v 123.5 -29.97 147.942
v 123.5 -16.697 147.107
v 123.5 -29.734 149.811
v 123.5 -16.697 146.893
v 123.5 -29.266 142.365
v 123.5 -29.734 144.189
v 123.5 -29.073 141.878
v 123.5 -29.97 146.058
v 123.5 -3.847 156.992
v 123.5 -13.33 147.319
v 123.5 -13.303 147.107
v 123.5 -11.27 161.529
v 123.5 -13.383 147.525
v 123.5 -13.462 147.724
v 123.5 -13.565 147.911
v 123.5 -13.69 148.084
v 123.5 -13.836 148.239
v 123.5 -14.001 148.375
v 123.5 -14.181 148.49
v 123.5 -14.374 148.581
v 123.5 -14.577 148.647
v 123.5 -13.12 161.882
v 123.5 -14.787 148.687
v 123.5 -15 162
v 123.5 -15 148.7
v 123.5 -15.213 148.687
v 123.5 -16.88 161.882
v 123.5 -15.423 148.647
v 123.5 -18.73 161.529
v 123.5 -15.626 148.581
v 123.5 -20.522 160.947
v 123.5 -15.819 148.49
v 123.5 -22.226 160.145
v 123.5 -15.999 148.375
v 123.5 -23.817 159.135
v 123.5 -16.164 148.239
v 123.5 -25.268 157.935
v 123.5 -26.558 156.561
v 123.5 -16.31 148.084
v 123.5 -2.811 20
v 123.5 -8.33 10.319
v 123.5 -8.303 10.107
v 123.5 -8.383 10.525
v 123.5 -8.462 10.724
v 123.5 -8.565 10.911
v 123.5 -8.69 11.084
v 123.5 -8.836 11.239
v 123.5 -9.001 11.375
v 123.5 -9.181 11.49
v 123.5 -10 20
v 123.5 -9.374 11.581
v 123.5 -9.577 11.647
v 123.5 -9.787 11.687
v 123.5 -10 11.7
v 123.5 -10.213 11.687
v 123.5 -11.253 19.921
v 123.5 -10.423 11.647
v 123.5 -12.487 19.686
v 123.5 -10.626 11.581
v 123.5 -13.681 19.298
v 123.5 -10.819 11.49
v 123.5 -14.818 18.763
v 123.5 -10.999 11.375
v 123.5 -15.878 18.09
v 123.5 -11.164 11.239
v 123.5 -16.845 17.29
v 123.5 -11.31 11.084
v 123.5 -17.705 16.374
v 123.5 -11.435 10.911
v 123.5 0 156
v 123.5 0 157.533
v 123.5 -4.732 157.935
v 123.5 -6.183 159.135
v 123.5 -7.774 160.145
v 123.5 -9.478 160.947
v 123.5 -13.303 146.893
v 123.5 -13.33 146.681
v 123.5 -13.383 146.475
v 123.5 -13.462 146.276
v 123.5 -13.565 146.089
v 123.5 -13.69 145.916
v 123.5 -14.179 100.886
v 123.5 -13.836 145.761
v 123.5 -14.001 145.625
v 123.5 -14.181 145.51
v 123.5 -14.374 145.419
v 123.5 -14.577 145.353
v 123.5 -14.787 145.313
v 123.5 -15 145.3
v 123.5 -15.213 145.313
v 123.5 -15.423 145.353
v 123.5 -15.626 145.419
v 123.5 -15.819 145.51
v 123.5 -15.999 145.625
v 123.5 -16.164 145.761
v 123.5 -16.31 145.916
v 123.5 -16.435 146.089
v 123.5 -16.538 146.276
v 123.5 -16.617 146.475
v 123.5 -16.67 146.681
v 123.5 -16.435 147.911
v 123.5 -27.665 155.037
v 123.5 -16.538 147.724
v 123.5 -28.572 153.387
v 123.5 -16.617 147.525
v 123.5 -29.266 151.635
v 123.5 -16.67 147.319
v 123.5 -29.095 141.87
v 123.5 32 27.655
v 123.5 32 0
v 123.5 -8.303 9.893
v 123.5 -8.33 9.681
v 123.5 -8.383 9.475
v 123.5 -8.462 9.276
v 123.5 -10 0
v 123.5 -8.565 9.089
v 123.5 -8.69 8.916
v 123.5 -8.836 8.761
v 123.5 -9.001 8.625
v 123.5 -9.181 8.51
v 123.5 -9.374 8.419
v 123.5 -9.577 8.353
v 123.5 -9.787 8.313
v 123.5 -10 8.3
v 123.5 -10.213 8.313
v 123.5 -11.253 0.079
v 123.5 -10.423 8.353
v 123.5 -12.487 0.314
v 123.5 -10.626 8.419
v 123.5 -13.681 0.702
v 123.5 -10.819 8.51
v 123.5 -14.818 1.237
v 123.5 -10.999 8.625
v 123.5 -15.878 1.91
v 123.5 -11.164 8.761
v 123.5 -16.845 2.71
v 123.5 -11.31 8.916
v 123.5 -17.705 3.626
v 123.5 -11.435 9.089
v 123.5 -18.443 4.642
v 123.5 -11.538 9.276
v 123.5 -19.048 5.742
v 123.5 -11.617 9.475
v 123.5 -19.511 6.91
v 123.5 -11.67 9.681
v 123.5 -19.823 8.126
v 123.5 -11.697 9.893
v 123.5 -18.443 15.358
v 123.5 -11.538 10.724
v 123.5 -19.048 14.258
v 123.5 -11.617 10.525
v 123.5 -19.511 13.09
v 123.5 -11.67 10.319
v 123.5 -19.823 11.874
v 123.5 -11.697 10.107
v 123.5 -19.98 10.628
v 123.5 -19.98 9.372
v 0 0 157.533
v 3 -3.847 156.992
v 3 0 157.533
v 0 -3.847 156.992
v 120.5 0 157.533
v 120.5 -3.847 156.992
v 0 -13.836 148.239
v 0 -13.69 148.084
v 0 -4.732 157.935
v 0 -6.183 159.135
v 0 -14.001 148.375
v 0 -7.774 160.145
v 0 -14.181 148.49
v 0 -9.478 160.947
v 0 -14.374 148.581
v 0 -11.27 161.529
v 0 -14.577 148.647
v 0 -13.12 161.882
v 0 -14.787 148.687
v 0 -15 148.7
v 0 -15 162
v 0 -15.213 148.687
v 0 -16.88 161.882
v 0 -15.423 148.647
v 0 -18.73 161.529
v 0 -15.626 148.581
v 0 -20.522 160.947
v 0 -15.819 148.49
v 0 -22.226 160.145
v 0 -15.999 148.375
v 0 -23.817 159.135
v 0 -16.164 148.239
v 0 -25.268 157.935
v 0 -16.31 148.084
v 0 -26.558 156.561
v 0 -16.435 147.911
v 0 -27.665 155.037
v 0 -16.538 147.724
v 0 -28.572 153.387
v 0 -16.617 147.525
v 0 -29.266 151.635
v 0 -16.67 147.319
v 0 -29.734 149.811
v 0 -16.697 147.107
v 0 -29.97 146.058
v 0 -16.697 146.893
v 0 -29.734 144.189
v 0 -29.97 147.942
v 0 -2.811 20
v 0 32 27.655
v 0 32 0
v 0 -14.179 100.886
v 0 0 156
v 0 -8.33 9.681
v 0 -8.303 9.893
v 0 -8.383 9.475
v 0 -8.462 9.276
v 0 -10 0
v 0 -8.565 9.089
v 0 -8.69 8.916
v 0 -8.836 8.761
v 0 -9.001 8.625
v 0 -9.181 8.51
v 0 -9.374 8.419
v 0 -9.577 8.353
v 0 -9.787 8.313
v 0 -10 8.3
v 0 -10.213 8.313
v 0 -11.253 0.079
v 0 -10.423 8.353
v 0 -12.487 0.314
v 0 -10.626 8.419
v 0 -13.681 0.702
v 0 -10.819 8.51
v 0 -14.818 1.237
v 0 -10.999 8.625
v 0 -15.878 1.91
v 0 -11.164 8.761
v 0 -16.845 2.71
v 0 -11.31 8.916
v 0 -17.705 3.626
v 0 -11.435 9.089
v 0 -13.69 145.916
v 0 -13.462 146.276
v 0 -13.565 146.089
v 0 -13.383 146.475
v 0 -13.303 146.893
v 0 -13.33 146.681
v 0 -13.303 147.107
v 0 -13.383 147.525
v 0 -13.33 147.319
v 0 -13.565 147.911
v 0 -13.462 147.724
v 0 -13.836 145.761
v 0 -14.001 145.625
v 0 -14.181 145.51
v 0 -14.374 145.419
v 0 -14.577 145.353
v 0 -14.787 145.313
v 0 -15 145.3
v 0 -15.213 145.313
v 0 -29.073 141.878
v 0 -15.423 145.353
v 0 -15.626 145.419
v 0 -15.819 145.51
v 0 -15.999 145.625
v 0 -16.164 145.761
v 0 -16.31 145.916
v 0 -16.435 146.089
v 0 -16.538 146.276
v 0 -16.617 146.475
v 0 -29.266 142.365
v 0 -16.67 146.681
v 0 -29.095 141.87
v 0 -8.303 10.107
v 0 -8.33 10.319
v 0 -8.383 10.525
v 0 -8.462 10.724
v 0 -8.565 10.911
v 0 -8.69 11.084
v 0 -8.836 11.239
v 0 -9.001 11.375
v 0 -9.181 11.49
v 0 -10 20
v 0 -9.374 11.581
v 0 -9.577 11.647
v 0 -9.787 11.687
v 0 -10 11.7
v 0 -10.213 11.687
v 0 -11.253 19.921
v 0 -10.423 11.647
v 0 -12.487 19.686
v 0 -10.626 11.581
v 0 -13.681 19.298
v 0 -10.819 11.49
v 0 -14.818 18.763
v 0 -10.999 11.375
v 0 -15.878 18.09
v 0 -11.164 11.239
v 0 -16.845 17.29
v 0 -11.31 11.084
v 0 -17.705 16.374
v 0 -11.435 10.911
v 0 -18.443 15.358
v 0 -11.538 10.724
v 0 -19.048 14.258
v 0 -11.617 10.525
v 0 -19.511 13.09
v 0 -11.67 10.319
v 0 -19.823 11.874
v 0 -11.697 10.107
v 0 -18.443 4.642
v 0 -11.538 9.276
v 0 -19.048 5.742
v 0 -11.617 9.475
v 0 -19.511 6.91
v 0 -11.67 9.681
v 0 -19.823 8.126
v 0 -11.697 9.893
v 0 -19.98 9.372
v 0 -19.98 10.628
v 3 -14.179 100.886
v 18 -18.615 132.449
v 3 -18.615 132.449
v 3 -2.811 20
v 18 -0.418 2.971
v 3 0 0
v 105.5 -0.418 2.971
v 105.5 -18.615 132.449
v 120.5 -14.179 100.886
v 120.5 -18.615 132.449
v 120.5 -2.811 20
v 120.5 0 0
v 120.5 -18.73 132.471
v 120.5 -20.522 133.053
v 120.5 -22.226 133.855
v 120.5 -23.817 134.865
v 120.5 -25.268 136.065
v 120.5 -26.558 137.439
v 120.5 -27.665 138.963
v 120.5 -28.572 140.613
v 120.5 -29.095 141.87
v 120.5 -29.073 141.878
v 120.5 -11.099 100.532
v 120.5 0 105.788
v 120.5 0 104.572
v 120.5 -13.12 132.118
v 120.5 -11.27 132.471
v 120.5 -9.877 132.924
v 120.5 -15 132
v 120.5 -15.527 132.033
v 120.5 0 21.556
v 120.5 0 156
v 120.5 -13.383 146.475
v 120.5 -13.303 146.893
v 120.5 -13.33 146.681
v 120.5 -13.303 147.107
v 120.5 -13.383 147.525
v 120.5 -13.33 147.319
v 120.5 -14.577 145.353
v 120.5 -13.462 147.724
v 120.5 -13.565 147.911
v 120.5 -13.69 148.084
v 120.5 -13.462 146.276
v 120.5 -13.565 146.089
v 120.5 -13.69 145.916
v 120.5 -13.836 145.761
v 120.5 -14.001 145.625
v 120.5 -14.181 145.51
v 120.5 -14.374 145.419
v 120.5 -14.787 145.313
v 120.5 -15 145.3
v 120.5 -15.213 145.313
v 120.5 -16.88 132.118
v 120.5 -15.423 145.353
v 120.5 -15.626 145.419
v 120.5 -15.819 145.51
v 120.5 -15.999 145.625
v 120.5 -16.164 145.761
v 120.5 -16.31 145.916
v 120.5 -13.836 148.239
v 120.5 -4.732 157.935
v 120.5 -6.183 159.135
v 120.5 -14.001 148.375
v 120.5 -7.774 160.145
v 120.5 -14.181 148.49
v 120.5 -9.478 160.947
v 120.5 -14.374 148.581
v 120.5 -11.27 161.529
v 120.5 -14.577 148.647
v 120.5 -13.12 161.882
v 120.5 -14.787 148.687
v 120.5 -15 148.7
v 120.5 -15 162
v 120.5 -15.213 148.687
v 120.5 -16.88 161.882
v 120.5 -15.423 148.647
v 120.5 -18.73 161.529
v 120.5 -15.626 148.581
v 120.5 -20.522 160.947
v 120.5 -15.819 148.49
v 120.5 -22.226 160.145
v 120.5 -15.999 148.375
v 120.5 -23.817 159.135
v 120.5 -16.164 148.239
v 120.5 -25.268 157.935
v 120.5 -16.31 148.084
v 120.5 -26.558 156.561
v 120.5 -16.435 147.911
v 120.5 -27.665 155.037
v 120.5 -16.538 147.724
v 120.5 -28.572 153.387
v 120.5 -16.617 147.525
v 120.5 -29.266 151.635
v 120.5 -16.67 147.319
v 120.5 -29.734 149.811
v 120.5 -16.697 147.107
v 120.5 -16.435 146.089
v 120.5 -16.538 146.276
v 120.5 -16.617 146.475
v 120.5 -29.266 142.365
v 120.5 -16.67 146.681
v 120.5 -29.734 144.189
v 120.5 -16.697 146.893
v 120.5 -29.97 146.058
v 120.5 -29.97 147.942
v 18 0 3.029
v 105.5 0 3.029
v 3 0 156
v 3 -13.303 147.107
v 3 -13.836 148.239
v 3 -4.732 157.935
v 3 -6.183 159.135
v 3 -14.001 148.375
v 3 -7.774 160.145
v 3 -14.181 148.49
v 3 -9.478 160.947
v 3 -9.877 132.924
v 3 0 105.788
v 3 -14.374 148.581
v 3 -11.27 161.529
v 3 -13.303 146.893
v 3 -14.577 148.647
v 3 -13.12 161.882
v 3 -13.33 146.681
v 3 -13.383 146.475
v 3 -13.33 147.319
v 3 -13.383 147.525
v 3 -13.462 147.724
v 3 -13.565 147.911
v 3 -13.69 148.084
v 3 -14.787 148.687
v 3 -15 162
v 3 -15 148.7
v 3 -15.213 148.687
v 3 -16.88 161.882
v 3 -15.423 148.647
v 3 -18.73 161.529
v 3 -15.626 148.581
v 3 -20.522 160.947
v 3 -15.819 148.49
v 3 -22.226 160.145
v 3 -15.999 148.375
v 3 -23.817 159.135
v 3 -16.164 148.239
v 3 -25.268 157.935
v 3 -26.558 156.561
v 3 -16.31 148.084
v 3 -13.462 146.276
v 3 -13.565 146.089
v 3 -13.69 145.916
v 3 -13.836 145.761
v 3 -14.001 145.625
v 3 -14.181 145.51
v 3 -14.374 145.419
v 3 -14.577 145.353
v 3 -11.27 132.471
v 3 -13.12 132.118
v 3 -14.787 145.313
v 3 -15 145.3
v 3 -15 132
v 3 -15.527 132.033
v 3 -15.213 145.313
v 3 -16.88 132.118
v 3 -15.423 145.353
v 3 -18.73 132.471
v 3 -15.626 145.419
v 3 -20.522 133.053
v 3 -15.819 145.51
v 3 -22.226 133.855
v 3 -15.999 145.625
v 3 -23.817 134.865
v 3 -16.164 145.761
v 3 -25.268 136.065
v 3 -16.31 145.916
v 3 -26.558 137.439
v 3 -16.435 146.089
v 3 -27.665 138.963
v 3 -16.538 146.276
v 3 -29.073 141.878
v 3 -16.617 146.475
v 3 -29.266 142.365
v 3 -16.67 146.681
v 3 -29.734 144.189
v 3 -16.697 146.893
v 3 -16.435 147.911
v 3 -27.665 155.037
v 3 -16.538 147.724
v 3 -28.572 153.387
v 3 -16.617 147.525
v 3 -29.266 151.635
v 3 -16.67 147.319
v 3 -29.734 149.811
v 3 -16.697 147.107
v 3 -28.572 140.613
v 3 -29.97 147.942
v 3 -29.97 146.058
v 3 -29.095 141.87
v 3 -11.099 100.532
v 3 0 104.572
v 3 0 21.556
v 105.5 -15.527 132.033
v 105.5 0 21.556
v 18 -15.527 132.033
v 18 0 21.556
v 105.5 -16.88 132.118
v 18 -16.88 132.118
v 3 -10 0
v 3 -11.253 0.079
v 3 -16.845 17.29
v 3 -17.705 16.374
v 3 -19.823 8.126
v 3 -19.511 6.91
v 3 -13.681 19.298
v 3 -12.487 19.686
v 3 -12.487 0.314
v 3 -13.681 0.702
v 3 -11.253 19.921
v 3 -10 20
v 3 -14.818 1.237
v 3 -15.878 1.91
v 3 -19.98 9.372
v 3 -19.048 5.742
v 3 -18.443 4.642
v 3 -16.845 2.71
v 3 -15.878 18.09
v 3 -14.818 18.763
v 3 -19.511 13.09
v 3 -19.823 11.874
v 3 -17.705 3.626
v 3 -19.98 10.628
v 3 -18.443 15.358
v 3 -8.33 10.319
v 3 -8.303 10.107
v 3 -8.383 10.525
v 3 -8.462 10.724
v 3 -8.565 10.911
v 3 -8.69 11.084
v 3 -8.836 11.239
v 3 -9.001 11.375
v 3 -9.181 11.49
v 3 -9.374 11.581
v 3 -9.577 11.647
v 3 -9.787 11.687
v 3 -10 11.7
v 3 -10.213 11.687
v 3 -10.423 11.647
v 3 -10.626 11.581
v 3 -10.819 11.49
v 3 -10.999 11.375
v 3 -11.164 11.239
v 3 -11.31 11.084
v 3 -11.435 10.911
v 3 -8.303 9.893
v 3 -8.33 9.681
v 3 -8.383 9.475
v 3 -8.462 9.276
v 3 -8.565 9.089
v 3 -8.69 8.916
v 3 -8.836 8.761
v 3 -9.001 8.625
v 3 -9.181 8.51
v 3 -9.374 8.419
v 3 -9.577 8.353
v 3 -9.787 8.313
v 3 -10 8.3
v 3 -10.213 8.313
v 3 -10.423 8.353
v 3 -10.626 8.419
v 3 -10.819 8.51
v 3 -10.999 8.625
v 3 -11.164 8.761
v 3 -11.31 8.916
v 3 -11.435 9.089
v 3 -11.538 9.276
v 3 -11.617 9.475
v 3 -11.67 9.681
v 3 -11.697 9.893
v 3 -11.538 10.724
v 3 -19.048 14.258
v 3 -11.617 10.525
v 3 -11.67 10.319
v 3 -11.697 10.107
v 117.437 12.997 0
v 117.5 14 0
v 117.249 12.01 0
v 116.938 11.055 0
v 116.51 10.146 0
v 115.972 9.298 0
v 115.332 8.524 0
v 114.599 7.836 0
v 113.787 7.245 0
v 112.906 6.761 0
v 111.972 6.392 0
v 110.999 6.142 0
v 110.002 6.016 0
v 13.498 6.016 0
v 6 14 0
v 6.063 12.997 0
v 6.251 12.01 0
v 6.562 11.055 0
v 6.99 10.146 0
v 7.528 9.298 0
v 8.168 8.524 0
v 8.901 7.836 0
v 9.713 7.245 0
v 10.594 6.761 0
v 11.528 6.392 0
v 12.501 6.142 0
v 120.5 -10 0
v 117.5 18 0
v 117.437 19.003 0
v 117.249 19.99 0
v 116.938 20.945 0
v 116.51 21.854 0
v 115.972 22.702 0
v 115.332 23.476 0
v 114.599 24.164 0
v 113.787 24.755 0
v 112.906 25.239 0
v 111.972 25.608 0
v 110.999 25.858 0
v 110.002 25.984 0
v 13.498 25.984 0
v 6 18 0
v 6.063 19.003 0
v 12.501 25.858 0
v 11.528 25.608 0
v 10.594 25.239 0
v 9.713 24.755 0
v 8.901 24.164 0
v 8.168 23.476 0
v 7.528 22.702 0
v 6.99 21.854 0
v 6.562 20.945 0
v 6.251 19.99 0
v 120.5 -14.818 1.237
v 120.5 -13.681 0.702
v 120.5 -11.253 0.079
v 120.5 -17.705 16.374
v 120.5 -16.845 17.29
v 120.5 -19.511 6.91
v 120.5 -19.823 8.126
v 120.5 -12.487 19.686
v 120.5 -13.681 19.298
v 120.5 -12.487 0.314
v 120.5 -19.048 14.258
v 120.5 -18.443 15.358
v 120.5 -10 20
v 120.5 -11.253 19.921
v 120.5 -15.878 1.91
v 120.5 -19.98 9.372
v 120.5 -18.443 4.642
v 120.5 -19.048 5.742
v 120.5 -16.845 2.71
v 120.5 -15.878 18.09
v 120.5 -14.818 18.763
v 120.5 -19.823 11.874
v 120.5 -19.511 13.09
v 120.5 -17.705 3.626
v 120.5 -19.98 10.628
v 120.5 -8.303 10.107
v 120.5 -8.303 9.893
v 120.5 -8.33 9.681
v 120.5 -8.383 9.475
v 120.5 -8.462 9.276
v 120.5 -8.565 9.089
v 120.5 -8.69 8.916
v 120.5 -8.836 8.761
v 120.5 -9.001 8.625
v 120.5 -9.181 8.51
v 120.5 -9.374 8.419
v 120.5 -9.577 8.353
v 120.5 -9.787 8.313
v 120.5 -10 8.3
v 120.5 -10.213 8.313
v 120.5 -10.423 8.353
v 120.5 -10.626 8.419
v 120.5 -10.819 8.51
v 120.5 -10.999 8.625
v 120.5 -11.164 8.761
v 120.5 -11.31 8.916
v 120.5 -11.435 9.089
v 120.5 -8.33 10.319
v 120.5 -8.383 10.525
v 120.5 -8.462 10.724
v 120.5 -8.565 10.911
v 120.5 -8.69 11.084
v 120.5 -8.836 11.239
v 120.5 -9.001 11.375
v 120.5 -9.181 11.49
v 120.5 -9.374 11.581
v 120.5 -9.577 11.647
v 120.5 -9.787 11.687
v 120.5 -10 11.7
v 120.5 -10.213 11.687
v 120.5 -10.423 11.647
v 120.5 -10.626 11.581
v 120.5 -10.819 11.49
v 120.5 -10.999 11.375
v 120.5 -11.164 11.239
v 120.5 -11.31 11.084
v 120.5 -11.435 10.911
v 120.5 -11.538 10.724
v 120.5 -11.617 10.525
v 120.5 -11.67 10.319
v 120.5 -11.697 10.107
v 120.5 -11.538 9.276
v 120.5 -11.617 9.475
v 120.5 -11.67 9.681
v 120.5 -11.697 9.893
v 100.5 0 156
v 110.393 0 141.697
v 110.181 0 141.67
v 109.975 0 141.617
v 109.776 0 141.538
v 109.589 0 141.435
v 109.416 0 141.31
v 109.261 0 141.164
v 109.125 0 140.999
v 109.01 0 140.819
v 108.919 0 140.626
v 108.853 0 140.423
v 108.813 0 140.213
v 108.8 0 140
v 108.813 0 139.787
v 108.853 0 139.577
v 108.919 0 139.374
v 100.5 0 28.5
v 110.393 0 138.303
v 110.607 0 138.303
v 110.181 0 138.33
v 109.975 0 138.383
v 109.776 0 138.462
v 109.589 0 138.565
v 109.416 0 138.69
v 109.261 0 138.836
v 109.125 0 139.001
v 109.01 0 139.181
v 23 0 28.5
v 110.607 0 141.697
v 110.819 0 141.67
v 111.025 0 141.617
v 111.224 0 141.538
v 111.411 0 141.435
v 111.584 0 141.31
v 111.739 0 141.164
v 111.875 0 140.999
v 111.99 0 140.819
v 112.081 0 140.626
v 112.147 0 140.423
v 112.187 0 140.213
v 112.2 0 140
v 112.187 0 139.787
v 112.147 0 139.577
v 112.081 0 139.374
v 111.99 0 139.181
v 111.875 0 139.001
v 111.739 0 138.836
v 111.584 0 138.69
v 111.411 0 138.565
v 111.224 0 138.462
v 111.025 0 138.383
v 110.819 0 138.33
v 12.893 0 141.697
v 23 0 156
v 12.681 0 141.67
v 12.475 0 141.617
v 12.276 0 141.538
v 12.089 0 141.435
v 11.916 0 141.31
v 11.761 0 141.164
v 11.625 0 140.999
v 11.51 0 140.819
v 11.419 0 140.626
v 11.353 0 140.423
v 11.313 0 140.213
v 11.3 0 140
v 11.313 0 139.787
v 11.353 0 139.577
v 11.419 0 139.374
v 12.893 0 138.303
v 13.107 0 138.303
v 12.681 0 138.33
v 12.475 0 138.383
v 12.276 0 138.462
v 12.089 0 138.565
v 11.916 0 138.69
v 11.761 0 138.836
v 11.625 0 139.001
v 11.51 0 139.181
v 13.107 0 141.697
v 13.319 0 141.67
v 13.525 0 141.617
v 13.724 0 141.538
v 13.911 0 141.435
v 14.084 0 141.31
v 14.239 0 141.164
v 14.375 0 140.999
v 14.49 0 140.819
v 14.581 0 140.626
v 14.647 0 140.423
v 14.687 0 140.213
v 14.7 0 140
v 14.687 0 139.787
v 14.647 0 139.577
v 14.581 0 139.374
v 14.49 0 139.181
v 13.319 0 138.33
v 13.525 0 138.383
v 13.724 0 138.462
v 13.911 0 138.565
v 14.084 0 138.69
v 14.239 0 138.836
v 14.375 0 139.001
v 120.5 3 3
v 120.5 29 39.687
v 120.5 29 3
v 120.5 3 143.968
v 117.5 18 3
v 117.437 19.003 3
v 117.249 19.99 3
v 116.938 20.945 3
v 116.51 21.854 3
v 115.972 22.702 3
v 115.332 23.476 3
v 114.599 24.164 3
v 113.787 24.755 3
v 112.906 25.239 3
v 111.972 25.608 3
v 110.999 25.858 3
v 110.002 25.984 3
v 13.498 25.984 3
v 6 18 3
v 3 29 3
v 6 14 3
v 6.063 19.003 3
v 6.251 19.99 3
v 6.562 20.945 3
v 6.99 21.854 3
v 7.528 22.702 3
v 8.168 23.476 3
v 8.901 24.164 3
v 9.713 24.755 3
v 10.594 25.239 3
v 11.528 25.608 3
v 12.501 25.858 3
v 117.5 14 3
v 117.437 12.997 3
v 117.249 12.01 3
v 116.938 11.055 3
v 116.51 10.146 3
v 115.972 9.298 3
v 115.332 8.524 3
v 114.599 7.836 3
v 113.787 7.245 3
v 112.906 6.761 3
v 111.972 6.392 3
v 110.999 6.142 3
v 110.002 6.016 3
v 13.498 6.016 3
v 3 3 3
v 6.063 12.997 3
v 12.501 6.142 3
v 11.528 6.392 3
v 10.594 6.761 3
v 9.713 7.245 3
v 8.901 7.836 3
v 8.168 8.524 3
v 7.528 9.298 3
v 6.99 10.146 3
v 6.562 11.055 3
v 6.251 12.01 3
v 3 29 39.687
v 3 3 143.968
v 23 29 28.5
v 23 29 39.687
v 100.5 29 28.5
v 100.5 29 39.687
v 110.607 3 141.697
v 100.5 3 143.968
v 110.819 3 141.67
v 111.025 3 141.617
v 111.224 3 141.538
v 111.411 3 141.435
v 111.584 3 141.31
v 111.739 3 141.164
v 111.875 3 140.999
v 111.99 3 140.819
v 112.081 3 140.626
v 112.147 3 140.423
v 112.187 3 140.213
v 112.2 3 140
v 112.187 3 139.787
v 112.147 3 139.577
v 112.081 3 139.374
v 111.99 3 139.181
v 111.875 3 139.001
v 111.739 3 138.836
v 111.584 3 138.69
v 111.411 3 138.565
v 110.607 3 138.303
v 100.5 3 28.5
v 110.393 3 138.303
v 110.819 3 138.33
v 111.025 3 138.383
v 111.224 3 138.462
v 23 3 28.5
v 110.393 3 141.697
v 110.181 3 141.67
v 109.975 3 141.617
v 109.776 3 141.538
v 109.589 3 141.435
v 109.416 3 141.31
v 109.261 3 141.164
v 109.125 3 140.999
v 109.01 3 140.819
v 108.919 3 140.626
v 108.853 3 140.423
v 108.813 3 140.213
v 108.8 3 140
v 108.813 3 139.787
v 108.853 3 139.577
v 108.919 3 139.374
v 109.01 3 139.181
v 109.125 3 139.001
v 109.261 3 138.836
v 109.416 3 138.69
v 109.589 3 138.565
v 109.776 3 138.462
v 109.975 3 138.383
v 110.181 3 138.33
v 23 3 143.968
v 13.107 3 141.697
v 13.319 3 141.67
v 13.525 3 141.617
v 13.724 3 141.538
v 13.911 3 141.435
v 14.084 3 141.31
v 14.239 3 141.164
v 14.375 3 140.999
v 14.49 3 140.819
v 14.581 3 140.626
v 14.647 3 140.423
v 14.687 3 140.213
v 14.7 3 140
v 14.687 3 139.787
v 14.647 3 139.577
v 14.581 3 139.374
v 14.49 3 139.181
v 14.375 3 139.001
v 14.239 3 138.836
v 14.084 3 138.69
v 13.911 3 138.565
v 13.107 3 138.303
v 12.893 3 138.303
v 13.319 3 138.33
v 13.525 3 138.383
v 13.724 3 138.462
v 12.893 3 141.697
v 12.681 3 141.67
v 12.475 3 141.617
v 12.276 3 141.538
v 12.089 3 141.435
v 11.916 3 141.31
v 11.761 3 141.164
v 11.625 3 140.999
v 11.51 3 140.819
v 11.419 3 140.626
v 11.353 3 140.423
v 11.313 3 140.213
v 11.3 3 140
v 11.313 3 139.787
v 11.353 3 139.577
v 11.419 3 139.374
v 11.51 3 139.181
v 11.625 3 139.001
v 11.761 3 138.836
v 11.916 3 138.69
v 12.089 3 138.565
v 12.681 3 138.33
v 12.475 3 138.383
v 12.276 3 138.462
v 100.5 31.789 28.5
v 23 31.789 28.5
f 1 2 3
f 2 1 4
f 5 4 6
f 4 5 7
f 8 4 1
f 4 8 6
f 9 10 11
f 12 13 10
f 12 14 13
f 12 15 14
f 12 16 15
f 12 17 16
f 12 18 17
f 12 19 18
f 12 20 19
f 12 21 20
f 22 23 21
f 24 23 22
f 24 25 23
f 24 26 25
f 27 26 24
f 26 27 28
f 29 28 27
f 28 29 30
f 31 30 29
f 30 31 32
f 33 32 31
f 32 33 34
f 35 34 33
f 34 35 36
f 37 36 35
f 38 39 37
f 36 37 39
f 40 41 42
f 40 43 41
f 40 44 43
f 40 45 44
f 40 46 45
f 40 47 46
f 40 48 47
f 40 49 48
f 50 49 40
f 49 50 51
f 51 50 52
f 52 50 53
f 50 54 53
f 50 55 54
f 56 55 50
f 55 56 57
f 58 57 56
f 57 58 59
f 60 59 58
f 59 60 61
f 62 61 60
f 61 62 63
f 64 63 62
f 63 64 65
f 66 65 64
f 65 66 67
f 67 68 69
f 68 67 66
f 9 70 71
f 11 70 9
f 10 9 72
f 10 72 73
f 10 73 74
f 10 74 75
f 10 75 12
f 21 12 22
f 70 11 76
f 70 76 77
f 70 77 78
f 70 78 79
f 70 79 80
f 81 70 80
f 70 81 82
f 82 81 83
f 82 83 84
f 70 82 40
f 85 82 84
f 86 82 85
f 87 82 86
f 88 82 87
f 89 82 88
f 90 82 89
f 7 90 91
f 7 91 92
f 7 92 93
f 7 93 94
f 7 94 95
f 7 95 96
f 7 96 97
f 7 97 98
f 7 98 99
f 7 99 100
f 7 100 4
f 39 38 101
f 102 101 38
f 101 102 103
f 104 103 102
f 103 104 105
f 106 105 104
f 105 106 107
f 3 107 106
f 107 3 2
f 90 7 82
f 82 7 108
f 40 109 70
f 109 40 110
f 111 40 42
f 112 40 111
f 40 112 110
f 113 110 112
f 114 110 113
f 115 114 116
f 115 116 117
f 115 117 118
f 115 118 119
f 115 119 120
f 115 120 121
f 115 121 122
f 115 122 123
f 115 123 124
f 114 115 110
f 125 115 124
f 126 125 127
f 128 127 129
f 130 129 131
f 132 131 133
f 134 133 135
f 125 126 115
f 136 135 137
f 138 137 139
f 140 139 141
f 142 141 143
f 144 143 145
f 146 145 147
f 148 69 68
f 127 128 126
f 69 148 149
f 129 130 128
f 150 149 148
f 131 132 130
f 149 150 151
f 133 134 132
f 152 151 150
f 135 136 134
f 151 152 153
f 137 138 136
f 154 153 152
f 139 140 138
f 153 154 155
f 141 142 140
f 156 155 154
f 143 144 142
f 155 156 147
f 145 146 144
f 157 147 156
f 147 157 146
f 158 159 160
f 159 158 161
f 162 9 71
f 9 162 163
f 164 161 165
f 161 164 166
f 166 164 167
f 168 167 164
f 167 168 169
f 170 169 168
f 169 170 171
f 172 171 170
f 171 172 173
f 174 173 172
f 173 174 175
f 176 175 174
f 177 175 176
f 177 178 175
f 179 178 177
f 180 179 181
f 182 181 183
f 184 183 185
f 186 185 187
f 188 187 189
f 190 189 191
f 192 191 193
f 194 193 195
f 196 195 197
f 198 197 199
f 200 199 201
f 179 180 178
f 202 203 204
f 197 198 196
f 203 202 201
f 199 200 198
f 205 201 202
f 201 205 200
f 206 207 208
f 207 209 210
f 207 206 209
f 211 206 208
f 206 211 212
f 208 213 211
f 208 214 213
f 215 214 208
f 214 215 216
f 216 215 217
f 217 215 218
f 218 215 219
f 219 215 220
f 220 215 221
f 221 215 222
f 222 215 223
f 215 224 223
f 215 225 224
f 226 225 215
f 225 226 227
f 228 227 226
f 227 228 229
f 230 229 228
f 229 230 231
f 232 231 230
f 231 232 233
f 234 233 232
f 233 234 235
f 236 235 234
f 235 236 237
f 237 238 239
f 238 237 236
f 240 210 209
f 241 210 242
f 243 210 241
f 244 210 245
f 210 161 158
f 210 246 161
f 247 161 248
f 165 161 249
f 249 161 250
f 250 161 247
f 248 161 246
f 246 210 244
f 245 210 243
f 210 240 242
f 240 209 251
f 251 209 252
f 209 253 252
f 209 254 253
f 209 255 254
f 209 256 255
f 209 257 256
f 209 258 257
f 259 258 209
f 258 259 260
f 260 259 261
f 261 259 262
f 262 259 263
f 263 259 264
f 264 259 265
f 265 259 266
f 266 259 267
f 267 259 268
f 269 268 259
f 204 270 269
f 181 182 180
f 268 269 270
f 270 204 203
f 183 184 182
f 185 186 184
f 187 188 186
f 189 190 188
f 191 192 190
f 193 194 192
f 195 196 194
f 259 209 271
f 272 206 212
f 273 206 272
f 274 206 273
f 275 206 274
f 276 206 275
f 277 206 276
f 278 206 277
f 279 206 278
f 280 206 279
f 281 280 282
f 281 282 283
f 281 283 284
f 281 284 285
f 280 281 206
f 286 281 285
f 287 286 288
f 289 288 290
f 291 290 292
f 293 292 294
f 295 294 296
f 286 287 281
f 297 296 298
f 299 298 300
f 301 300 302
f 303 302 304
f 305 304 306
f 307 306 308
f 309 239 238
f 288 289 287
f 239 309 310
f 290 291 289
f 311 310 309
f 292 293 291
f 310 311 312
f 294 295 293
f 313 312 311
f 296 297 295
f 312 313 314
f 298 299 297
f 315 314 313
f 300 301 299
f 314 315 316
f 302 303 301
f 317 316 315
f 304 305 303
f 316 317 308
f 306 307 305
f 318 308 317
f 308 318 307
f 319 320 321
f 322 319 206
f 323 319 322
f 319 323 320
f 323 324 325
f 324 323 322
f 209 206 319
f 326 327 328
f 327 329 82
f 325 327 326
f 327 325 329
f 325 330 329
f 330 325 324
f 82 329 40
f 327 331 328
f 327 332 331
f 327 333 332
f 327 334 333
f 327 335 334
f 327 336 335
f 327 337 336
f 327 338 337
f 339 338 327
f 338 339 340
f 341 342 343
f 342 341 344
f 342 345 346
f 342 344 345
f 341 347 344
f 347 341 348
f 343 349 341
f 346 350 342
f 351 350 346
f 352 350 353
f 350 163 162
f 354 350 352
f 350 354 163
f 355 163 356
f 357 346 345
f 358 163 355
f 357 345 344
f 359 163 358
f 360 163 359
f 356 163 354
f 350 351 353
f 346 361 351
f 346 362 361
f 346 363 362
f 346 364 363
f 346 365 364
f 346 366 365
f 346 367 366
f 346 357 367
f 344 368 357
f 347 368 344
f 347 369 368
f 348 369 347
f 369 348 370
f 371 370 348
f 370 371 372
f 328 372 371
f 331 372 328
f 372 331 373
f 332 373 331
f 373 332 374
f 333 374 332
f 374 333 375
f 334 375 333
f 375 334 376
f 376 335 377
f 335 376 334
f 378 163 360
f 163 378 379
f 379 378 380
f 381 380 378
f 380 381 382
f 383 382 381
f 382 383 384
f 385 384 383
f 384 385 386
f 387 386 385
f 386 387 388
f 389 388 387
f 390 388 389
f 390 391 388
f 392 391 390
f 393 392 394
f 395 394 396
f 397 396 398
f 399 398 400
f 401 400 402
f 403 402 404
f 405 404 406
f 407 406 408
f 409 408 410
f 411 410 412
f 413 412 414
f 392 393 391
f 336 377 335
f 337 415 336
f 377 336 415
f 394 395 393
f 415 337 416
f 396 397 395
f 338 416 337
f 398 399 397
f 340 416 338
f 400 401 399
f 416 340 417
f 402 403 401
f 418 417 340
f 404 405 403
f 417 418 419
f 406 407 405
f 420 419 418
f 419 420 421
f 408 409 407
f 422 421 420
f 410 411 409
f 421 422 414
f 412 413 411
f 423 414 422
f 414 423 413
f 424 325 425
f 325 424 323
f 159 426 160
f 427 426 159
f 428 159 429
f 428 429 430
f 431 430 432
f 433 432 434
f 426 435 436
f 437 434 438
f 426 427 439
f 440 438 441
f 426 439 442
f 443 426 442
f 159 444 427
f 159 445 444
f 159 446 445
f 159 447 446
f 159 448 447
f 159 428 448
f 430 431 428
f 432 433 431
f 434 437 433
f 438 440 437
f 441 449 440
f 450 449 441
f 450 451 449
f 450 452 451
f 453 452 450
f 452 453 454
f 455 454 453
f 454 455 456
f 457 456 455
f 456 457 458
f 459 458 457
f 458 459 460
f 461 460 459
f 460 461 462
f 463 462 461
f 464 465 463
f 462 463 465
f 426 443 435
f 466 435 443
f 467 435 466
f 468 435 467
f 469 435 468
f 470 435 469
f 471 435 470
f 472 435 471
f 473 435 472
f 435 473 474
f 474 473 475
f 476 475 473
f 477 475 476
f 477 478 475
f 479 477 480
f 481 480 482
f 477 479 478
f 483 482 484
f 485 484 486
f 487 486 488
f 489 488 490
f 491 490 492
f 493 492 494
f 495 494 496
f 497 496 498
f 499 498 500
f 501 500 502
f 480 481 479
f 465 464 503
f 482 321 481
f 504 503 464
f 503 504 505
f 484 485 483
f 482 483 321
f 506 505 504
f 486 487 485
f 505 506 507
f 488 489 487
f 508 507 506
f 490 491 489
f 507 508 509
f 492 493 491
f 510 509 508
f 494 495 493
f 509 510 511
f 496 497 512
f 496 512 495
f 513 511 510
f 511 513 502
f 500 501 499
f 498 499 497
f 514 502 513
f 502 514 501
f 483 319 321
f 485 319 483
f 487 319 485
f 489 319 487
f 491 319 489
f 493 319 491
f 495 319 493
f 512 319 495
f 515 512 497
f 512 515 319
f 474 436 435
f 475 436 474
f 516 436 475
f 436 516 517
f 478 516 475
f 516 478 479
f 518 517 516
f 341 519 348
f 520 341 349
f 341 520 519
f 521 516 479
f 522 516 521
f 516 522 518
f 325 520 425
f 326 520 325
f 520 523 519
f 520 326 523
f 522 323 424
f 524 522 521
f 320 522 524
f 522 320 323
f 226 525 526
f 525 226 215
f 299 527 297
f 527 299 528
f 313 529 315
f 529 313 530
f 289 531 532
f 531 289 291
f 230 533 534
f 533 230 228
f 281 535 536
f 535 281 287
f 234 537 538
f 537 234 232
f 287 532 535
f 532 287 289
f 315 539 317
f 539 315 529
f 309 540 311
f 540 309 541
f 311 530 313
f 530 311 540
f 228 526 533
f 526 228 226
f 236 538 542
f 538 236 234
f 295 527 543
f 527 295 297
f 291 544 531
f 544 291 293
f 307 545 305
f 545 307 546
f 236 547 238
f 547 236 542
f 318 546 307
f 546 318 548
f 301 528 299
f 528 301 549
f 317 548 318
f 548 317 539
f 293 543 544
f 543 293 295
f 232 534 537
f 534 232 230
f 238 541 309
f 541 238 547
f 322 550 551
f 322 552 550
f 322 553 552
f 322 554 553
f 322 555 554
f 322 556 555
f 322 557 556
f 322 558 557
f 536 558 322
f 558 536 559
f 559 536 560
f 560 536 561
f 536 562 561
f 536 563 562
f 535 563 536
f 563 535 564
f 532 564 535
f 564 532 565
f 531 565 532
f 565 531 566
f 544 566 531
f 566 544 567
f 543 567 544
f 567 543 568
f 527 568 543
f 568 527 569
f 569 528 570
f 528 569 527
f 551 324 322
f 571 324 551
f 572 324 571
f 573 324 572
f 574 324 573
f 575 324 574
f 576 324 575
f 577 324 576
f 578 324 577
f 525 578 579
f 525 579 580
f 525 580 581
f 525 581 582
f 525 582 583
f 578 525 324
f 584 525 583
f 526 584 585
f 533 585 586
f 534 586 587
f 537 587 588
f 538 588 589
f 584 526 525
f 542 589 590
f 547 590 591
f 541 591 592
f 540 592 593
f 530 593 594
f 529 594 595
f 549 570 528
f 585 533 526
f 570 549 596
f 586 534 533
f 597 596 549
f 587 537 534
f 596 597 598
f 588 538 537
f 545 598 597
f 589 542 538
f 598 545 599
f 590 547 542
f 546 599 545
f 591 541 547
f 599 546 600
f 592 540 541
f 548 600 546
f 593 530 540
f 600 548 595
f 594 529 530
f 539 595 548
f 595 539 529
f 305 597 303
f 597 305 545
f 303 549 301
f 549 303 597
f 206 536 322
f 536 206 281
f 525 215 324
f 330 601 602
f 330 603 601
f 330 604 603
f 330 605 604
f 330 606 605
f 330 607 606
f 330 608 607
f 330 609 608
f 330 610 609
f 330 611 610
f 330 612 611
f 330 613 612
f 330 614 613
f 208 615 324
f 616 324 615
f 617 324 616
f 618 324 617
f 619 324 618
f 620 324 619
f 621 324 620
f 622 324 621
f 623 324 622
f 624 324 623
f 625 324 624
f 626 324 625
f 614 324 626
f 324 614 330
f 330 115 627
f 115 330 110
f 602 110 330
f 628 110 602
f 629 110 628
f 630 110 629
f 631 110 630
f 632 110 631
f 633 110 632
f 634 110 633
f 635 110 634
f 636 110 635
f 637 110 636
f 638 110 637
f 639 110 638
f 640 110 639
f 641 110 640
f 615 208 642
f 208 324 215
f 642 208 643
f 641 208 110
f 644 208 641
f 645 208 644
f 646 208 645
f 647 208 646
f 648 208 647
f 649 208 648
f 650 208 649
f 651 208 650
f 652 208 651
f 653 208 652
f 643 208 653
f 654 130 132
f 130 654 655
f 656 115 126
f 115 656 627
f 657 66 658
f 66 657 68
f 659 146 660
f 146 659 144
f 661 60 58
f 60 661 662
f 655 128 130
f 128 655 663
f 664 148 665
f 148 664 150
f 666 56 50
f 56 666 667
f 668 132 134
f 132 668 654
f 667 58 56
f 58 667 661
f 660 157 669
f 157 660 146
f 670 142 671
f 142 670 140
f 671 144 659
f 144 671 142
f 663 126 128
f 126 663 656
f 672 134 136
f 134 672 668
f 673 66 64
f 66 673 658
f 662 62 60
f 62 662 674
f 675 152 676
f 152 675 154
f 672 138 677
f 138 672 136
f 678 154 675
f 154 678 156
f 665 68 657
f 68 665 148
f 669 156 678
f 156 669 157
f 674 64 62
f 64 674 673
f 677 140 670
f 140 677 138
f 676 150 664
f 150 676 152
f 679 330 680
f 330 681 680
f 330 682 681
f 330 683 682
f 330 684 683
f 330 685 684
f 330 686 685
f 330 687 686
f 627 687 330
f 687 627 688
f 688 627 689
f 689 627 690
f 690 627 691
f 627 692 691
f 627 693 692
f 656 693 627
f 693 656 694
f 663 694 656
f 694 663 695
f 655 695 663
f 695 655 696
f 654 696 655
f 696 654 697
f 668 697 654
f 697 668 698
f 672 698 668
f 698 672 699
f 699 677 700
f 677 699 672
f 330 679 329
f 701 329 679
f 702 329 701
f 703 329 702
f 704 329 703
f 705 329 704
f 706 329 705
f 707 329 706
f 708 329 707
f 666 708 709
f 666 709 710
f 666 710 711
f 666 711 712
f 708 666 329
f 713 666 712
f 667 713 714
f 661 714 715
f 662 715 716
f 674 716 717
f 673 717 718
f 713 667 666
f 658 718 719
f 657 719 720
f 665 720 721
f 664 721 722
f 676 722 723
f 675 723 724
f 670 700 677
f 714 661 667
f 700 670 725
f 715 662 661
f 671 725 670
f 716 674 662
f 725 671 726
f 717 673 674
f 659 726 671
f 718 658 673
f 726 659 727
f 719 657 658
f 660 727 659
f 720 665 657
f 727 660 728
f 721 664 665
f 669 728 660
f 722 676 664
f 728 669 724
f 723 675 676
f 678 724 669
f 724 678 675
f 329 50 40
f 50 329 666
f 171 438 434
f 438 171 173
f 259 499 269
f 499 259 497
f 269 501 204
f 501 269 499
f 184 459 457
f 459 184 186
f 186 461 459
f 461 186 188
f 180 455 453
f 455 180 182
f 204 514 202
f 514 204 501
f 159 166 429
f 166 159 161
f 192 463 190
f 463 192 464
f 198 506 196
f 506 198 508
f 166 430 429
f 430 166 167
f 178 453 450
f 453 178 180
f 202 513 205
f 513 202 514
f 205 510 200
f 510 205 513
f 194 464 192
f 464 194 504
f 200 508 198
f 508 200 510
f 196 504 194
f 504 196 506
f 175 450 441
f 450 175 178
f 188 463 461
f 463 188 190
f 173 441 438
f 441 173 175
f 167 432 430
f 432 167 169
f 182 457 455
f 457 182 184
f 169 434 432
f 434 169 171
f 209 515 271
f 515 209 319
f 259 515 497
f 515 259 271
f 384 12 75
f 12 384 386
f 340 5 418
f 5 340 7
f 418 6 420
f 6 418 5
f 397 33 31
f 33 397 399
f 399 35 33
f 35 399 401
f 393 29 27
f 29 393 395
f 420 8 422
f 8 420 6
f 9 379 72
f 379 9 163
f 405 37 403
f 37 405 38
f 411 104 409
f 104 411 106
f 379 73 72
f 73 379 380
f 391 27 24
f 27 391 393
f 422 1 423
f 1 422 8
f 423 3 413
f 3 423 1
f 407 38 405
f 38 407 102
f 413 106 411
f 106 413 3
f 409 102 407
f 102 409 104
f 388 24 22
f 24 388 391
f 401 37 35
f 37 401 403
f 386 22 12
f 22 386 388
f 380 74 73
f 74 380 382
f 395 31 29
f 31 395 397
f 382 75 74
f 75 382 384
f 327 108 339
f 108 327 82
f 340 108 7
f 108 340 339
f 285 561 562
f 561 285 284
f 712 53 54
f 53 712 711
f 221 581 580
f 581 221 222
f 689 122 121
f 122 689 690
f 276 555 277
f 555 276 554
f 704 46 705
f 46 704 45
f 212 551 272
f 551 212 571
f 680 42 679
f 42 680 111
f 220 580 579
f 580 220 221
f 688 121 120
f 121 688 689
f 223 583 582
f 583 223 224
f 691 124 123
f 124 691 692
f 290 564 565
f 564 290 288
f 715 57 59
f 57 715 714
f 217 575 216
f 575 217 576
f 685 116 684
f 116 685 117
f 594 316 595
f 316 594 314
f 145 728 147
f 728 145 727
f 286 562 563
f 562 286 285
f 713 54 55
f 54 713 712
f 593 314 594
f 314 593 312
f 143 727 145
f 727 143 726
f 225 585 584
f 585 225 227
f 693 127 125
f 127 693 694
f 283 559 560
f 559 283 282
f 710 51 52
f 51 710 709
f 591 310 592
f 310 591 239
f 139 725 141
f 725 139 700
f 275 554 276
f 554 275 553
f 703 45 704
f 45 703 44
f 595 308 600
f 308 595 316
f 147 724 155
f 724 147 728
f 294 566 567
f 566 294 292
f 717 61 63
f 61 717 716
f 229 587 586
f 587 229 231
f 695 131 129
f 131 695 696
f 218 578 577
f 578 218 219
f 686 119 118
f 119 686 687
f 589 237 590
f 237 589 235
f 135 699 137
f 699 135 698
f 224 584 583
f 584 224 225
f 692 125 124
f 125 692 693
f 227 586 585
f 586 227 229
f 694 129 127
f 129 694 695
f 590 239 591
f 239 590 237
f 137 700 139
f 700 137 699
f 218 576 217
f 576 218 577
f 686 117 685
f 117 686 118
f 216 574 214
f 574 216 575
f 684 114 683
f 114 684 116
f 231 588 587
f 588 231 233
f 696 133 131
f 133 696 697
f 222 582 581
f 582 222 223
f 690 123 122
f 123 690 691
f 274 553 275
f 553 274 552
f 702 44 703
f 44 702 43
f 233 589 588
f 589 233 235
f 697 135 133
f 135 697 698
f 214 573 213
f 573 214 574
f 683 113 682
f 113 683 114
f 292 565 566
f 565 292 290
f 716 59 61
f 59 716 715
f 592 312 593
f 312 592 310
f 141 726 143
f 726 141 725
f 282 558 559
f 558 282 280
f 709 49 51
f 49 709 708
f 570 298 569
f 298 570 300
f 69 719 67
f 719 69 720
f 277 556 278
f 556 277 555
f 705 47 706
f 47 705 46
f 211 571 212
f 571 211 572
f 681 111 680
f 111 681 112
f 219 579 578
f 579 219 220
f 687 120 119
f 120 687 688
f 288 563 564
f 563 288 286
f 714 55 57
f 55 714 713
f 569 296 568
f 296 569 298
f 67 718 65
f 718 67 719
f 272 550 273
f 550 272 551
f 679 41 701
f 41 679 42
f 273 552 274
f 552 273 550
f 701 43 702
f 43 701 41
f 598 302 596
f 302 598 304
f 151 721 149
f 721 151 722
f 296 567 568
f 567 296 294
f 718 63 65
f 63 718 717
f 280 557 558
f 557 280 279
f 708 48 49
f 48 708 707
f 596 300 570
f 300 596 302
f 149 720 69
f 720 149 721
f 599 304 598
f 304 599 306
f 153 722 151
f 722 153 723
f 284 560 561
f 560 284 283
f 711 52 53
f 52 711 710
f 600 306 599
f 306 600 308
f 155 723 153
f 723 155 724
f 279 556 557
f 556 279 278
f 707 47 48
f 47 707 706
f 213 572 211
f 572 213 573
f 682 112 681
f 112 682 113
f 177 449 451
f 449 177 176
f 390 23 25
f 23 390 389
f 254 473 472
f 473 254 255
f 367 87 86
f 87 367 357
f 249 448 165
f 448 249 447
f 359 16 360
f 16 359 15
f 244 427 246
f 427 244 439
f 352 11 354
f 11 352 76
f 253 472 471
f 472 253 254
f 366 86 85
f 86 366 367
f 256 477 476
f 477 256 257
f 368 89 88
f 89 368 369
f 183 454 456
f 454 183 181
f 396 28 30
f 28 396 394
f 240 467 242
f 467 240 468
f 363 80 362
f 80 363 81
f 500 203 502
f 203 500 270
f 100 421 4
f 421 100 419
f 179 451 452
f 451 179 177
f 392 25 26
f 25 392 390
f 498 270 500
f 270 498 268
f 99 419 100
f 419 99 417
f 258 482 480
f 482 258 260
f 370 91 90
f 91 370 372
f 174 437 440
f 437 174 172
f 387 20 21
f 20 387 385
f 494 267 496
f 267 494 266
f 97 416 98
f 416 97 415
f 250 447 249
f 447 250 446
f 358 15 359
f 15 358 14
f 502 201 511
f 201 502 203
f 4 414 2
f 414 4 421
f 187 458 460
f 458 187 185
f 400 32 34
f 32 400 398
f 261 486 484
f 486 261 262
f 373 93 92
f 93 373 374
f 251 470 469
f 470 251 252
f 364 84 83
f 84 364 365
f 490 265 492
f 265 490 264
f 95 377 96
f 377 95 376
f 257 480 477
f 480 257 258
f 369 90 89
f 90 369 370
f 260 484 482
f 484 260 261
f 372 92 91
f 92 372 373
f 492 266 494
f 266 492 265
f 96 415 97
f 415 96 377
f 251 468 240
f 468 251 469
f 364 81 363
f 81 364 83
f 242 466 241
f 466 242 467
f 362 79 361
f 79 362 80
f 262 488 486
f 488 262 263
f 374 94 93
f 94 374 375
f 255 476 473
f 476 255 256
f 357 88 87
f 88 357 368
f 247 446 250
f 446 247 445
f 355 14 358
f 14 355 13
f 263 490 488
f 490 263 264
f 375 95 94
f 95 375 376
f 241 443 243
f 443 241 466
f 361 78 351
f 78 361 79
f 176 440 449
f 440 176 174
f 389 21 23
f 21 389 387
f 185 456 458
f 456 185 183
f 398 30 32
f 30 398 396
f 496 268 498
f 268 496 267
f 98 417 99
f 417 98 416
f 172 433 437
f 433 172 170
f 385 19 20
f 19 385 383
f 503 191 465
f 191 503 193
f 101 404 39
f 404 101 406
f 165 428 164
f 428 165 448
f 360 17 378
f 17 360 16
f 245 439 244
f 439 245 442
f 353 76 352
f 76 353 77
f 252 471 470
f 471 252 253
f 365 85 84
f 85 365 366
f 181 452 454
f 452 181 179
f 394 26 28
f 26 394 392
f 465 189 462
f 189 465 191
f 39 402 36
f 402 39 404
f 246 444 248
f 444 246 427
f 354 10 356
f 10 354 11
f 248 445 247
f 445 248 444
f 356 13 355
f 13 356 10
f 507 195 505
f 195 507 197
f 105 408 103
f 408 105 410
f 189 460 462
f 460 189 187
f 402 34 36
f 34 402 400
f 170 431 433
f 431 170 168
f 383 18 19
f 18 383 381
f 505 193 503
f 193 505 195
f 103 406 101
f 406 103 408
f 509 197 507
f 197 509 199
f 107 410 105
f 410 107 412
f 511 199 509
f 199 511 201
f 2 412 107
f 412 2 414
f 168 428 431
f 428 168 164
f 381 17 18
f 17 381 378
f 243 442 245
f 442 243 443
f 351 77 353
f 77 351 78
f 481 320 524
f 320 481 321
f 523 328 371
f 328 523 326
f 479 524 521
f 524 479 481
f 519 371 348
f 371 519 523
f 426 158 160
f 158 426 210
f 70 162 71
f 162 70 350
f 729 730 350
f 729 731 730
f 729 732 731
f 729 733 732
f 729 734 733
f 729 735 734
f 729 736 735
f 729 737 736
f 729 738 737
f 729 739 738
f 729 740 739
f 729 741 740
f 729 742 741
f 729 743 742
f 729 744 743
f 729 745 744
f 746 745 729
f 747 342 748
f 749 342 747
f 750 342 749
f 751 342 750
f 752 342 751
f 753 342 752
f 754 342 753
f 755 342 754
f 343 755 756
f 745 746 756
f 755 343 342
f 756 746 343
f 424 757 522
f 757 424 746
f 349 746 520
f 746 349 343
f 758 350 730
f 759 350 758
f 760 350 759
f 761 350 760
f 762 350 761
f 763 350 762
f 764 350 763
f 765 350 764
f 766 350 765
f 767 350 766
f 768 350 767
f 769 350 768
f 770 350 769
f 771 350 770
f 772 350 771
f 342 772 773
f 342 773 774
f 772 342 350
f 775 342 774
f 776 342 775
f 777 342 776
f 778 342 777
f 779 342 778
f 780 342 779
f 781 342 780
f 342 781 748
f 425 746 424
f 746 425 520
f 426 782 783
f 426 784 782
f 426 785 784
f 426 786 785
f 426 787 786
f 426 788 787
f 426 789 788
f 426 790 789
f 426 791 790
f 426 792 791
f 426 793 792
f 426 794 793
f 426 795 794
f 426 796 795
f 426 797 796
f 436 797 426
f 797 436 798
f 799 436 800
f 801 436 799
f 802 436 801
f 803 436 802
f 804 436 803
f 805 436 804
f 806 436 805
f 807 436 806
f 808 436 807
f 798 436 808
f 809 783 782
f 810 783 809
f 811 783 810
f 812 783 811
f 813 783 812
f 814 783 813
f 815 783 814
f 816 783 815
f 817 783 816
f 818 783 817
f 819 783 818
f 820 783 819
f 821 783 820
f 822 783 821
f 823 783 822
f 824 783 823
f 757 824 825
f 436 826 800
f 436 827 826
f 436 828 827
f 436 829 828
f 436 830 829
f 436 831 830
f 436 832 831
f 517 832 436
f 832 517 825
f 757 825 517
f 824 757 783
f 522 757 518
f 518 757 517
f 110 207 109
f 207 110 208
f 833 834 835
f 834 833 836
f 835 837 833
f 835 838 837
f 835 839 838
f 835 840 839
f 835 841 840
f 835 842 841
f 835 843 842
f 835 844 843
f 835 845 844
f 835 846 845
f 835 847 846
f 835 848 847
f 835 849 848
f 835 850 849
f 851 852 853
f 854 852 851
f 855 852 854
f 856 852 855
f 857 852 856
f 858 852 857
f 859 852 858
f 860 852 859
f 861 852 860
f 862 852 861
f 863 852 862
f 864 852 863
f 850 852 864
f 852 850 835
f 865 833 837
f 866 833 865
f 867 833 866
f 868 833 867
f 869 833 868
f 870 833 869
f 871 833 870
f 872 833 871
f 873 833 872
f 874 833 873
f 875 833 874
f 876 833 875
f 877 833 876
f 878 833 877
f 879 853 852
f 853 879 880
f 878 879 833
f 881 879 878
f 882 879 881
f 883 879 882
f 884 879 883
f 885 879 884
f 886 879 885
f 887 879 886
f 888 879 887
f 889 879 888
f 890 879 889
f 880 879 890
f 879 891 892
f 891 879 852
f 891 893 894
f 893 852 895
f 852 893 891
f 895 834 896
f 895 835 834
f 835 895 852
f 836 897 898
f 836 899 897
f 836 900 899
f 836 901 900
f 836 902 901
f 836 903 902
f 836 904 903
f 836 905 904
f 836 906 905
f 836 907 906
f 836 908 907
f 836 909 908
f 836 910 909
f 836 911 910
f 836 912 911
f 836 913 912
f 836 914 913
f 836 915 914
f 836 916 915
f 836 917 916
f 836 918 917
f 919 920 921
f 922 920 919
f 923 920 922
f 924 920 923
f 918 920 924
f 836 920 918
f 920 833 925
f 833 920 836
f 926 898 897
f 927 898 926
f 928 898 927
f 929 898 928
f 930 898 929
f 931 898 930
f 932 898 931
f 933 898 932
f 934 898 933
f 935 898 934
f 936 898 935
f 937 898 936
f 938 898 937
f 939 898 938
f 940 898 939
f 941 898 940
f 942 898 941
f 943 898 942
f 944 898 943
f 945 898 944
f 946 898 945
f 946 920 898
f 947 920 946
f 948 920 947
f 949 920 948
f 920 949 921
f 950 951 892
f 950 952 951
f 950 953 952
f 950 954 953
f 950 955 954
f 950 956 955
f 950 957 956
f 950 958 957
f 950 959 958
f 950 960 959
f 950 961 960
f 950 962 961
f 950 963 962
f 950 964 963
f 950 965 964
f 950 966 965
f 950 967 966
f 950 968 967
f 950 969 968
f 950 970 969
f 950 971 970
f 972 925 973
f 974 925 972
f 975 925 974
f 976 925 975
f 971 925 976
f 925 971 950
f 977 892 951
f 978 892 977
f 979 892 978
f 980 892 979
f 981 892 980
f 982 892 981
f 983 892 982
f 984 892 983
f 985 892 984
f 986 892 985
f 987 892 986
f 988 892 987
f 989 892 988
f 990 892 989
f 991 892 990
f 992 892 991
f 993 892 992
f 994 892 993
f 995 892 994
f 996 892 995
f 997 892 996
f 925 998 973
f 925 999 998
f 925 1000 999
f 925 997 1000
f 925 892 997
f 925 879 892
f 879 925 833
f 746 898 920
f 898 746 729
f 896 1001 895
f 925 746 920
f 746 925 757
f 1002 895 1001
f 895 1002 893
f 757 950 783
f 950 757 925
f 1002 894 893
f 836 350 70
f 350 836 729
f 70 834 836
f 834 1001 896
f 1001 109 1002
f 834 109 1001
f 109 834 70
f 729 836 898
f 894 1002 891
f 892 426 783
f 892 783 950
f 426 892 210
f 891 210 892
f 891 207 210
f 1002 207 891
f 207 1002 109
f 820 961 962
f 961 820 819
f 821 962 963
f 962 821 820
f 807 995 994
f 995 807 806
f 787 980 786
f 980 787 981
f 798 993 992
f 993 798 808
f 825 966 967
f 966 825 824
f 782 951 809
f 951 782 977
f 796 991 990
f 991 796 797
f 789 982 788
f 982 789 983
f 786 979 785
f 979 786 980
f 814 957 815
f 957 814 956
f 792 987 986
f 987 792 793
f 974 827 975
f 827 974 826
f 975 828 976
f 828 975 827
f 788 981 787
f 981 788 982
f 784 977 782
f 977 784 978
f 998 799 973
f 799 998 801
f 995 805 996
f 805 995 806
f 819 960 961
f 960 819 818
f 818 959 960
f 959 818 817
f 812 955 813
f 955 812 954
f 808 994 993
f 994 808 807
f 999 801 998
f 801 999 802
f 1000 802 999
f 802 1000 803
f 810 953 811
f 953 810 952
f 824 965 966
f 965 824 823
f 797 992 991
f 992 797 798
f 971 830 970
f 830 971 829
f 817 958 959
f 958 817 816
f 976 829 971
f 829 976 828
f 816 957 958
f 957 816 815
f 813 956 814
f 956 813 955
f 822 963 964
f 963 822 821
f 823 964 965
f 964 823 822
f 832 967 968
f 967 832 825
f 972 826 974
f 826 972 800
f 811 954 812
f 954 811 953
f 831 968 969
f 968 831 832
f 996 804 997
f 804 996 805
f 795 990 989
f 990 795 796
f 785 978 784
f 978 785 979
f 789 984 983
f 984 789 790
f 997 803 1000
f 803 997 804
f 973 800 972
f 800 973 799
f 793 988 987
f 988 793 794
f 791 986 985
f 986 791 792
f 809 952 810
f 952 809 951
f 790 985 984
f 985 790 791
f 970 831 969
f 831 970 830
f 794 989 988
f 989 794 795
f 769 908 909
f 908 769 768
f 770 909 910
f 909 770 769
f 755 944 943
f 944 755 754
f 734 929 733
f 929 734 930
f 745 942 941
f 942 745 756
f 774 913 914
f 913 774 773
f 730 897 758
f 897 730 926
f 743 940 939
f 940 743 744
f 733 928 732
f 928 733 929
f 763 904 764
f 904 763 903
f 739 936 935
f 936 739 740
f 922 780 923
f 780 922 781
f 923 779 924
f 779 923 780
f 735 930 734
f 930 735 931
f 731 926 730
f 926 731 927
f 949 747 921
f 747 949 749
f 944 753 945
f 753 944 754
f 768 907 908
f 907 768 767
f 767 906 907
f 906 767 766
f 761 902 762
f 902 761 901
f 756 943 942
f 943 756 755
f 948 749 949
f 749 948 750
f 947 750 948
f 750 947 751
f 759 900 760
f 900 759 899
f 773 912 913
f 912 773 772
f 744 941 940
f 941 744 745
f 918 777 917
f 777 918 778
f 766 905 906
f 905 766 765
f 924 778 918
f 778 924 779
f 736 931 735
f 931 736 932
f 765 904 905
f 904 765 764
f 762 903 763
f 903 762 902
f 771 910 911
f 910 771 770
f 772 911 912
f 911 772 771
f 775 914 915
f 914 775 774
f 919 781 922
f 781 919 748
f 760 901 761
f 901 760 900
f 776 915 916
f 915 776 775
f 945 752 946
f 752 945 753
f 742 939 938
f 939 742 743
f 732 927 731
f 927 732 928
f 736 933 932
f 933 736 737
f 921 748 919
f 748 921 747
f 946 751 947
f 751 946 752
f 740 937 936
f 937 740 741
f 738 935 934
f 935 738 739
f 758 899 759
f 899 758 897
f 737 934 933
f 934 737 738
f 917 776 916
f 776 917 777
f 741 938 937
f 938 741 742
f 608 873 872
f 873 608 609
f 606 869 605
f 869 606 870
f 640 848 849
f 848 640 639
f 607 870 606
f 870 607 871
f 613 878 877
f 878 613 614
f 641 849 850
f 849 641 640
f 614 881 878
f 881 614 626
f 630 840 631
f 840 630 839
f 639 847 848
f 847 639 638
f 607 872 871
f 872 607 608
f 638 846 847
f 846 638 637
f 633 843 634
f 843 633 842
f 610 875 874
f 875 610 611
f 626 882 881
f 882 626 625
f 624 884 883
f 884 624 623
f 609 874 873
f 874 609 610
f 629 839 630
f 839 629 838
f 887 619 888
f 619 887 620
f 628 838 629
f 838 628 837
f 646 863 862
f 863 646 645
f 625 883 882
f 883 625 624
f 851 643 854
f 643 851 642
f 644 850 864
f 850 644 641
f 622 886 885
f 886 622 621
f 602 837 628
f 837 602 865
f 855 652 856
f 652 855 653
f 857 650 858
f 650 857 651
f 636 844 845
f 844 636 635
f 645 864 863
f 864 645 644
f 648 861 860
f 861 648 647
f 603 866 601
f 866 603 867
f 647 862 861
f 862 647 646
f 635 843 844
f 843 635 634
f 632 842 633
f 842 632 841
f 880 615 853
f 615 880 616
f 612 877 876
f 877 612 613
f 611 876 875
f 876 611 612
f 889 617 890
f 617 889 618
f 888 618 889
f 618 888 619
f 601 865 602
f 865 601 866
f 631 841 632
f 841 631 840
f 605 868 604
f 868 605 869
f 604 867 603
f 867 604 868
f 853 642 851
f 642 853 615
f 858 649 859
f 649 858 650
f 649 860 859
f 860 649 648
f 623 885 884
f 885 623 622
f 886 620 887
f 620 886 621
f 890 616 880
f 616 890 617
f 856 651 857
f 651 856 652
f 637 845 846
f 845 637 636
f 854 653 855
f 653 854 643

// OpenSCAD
$fn = 50;

ra = 20;
rv = 30;

hia = 30;
bia = 17.0;
lia = 108.5;

sp = 3;

d = 3;

h = 150;
hl = 140;
b = bia + d + 2*sp;
l = lia + d + 2*sp;


ba = 7;
la = 10;

a1 = 4 + sp;
a2 = a1 + 33;
a3 = a2 + 54;

ang = 14;


spa = 2;
da = 0.7;

ro = 5;
bk = 5;
rs = 6/2;
rsb= 3.2/2;
lo = 75;

lls = 15;
angs = 8;

Wr = 8;

rla = 10;
rli = 1.7;
rlisd = 3;

rhla = 15;

anglh = 20;

difference(){
	
	union(){
		rotate([angs,0,0]){
			difference(){
				cube([l+2*d,b+2*d,h+2*d]);
	
				translate([d,d,d]) cube([l,b+2*d,h+2*d]);
				translate([d+lls,-d,d]) cube([l-lls*2,b+2*d,h+2*d]);
	
			}
		}
		translate([0,-rla,rla]) rotate([0,90,0]) cylinder(r=rla,h=d);
		translate([0,-rla,0]) cube([d,rla,2*rla]);
		translate([lia+sp*2+d*2,-rla,rla]) rotate([0,90,0]) cylinder(r=rla,h=d);
		translate([lia+sp*2+d*2,-rla,0]) cube([d,rla,2*rla]);
		translate([0,-rhla,+h-d]) rotate([0,90,0]) cylinder(r=rhla,h=d);
		translate([0,-rhla,+h-d]) rotate([anglh+180,0,0])cube([d,rhla,3*rhla]);
		translate([lia+sp*2+d*2,-rhla,+h-d]) rotate([0,90,0]) cylinder(r=rhla,h=d);
		translate([lia+sp*2+d*2,-rhla,+h-d]) rotate([anglh+180,0,0])cube([d,rhla,3*rhla]);

	}
	translate([-1,-rla,rla]) rotate([0,90,0]) cylinder(r=rli,h=lia+sp*2+d*3+2);
	translate([-1,-rhla,h-d]) rotate([0,90,0]) cylinder(r=rli,h=lia+sp*2+d*3+2);
	translate([d,-rhla,+h-d]) rotate([0,90,0]) cylinder(r=rhla,h=lia+sp*3);

	translate([ra/2+d,-1,hl]) rotate([90,0,0]) cylinder(r=rlisd,h=h+d+2);
	translate([lia+sp*2+d*2-ra/2,-1,hl]) rotate([90,0,0]) cylinder(r=rlisd,h=h+d+2);

	translate([-d, 0, 0]) cube([l+4*d,b+4*d,h+4*d]);
}

difference(){
	cube([l+2*d,b+2*d,h+2*d]);
	translate([d,d,d]) cube([l,b,h+2*d]);
	translate([d+ra,-2*d,rv-0.5*d]) cube([l-2*ra,b+sp+4*d,h+2*d]);
	translate([0,0,h+2*d]) rotate([ang,0,0]) translate([-d,0,-(h+2*d)])cube([l+4*d,b+2*d,h+2*d]);
	translate([ra/2+d,d+1,hl]) rotate([90,0,0]) cylinder(r=rli,h=d+2);
	translate([lia+sp*2+d*2-ra/2,d+1,hl]) rotate([90,0,0]) cylinder(r=rli,h=d+2);

	minkowski(){
		translate([2*d+Wr,2*d+Wr,-d]) cube([l-2*d-2*Wr,b-2*d-2*Wr,h+2*d]);
		cylinder(r=Wr, h=1);
	}
}
